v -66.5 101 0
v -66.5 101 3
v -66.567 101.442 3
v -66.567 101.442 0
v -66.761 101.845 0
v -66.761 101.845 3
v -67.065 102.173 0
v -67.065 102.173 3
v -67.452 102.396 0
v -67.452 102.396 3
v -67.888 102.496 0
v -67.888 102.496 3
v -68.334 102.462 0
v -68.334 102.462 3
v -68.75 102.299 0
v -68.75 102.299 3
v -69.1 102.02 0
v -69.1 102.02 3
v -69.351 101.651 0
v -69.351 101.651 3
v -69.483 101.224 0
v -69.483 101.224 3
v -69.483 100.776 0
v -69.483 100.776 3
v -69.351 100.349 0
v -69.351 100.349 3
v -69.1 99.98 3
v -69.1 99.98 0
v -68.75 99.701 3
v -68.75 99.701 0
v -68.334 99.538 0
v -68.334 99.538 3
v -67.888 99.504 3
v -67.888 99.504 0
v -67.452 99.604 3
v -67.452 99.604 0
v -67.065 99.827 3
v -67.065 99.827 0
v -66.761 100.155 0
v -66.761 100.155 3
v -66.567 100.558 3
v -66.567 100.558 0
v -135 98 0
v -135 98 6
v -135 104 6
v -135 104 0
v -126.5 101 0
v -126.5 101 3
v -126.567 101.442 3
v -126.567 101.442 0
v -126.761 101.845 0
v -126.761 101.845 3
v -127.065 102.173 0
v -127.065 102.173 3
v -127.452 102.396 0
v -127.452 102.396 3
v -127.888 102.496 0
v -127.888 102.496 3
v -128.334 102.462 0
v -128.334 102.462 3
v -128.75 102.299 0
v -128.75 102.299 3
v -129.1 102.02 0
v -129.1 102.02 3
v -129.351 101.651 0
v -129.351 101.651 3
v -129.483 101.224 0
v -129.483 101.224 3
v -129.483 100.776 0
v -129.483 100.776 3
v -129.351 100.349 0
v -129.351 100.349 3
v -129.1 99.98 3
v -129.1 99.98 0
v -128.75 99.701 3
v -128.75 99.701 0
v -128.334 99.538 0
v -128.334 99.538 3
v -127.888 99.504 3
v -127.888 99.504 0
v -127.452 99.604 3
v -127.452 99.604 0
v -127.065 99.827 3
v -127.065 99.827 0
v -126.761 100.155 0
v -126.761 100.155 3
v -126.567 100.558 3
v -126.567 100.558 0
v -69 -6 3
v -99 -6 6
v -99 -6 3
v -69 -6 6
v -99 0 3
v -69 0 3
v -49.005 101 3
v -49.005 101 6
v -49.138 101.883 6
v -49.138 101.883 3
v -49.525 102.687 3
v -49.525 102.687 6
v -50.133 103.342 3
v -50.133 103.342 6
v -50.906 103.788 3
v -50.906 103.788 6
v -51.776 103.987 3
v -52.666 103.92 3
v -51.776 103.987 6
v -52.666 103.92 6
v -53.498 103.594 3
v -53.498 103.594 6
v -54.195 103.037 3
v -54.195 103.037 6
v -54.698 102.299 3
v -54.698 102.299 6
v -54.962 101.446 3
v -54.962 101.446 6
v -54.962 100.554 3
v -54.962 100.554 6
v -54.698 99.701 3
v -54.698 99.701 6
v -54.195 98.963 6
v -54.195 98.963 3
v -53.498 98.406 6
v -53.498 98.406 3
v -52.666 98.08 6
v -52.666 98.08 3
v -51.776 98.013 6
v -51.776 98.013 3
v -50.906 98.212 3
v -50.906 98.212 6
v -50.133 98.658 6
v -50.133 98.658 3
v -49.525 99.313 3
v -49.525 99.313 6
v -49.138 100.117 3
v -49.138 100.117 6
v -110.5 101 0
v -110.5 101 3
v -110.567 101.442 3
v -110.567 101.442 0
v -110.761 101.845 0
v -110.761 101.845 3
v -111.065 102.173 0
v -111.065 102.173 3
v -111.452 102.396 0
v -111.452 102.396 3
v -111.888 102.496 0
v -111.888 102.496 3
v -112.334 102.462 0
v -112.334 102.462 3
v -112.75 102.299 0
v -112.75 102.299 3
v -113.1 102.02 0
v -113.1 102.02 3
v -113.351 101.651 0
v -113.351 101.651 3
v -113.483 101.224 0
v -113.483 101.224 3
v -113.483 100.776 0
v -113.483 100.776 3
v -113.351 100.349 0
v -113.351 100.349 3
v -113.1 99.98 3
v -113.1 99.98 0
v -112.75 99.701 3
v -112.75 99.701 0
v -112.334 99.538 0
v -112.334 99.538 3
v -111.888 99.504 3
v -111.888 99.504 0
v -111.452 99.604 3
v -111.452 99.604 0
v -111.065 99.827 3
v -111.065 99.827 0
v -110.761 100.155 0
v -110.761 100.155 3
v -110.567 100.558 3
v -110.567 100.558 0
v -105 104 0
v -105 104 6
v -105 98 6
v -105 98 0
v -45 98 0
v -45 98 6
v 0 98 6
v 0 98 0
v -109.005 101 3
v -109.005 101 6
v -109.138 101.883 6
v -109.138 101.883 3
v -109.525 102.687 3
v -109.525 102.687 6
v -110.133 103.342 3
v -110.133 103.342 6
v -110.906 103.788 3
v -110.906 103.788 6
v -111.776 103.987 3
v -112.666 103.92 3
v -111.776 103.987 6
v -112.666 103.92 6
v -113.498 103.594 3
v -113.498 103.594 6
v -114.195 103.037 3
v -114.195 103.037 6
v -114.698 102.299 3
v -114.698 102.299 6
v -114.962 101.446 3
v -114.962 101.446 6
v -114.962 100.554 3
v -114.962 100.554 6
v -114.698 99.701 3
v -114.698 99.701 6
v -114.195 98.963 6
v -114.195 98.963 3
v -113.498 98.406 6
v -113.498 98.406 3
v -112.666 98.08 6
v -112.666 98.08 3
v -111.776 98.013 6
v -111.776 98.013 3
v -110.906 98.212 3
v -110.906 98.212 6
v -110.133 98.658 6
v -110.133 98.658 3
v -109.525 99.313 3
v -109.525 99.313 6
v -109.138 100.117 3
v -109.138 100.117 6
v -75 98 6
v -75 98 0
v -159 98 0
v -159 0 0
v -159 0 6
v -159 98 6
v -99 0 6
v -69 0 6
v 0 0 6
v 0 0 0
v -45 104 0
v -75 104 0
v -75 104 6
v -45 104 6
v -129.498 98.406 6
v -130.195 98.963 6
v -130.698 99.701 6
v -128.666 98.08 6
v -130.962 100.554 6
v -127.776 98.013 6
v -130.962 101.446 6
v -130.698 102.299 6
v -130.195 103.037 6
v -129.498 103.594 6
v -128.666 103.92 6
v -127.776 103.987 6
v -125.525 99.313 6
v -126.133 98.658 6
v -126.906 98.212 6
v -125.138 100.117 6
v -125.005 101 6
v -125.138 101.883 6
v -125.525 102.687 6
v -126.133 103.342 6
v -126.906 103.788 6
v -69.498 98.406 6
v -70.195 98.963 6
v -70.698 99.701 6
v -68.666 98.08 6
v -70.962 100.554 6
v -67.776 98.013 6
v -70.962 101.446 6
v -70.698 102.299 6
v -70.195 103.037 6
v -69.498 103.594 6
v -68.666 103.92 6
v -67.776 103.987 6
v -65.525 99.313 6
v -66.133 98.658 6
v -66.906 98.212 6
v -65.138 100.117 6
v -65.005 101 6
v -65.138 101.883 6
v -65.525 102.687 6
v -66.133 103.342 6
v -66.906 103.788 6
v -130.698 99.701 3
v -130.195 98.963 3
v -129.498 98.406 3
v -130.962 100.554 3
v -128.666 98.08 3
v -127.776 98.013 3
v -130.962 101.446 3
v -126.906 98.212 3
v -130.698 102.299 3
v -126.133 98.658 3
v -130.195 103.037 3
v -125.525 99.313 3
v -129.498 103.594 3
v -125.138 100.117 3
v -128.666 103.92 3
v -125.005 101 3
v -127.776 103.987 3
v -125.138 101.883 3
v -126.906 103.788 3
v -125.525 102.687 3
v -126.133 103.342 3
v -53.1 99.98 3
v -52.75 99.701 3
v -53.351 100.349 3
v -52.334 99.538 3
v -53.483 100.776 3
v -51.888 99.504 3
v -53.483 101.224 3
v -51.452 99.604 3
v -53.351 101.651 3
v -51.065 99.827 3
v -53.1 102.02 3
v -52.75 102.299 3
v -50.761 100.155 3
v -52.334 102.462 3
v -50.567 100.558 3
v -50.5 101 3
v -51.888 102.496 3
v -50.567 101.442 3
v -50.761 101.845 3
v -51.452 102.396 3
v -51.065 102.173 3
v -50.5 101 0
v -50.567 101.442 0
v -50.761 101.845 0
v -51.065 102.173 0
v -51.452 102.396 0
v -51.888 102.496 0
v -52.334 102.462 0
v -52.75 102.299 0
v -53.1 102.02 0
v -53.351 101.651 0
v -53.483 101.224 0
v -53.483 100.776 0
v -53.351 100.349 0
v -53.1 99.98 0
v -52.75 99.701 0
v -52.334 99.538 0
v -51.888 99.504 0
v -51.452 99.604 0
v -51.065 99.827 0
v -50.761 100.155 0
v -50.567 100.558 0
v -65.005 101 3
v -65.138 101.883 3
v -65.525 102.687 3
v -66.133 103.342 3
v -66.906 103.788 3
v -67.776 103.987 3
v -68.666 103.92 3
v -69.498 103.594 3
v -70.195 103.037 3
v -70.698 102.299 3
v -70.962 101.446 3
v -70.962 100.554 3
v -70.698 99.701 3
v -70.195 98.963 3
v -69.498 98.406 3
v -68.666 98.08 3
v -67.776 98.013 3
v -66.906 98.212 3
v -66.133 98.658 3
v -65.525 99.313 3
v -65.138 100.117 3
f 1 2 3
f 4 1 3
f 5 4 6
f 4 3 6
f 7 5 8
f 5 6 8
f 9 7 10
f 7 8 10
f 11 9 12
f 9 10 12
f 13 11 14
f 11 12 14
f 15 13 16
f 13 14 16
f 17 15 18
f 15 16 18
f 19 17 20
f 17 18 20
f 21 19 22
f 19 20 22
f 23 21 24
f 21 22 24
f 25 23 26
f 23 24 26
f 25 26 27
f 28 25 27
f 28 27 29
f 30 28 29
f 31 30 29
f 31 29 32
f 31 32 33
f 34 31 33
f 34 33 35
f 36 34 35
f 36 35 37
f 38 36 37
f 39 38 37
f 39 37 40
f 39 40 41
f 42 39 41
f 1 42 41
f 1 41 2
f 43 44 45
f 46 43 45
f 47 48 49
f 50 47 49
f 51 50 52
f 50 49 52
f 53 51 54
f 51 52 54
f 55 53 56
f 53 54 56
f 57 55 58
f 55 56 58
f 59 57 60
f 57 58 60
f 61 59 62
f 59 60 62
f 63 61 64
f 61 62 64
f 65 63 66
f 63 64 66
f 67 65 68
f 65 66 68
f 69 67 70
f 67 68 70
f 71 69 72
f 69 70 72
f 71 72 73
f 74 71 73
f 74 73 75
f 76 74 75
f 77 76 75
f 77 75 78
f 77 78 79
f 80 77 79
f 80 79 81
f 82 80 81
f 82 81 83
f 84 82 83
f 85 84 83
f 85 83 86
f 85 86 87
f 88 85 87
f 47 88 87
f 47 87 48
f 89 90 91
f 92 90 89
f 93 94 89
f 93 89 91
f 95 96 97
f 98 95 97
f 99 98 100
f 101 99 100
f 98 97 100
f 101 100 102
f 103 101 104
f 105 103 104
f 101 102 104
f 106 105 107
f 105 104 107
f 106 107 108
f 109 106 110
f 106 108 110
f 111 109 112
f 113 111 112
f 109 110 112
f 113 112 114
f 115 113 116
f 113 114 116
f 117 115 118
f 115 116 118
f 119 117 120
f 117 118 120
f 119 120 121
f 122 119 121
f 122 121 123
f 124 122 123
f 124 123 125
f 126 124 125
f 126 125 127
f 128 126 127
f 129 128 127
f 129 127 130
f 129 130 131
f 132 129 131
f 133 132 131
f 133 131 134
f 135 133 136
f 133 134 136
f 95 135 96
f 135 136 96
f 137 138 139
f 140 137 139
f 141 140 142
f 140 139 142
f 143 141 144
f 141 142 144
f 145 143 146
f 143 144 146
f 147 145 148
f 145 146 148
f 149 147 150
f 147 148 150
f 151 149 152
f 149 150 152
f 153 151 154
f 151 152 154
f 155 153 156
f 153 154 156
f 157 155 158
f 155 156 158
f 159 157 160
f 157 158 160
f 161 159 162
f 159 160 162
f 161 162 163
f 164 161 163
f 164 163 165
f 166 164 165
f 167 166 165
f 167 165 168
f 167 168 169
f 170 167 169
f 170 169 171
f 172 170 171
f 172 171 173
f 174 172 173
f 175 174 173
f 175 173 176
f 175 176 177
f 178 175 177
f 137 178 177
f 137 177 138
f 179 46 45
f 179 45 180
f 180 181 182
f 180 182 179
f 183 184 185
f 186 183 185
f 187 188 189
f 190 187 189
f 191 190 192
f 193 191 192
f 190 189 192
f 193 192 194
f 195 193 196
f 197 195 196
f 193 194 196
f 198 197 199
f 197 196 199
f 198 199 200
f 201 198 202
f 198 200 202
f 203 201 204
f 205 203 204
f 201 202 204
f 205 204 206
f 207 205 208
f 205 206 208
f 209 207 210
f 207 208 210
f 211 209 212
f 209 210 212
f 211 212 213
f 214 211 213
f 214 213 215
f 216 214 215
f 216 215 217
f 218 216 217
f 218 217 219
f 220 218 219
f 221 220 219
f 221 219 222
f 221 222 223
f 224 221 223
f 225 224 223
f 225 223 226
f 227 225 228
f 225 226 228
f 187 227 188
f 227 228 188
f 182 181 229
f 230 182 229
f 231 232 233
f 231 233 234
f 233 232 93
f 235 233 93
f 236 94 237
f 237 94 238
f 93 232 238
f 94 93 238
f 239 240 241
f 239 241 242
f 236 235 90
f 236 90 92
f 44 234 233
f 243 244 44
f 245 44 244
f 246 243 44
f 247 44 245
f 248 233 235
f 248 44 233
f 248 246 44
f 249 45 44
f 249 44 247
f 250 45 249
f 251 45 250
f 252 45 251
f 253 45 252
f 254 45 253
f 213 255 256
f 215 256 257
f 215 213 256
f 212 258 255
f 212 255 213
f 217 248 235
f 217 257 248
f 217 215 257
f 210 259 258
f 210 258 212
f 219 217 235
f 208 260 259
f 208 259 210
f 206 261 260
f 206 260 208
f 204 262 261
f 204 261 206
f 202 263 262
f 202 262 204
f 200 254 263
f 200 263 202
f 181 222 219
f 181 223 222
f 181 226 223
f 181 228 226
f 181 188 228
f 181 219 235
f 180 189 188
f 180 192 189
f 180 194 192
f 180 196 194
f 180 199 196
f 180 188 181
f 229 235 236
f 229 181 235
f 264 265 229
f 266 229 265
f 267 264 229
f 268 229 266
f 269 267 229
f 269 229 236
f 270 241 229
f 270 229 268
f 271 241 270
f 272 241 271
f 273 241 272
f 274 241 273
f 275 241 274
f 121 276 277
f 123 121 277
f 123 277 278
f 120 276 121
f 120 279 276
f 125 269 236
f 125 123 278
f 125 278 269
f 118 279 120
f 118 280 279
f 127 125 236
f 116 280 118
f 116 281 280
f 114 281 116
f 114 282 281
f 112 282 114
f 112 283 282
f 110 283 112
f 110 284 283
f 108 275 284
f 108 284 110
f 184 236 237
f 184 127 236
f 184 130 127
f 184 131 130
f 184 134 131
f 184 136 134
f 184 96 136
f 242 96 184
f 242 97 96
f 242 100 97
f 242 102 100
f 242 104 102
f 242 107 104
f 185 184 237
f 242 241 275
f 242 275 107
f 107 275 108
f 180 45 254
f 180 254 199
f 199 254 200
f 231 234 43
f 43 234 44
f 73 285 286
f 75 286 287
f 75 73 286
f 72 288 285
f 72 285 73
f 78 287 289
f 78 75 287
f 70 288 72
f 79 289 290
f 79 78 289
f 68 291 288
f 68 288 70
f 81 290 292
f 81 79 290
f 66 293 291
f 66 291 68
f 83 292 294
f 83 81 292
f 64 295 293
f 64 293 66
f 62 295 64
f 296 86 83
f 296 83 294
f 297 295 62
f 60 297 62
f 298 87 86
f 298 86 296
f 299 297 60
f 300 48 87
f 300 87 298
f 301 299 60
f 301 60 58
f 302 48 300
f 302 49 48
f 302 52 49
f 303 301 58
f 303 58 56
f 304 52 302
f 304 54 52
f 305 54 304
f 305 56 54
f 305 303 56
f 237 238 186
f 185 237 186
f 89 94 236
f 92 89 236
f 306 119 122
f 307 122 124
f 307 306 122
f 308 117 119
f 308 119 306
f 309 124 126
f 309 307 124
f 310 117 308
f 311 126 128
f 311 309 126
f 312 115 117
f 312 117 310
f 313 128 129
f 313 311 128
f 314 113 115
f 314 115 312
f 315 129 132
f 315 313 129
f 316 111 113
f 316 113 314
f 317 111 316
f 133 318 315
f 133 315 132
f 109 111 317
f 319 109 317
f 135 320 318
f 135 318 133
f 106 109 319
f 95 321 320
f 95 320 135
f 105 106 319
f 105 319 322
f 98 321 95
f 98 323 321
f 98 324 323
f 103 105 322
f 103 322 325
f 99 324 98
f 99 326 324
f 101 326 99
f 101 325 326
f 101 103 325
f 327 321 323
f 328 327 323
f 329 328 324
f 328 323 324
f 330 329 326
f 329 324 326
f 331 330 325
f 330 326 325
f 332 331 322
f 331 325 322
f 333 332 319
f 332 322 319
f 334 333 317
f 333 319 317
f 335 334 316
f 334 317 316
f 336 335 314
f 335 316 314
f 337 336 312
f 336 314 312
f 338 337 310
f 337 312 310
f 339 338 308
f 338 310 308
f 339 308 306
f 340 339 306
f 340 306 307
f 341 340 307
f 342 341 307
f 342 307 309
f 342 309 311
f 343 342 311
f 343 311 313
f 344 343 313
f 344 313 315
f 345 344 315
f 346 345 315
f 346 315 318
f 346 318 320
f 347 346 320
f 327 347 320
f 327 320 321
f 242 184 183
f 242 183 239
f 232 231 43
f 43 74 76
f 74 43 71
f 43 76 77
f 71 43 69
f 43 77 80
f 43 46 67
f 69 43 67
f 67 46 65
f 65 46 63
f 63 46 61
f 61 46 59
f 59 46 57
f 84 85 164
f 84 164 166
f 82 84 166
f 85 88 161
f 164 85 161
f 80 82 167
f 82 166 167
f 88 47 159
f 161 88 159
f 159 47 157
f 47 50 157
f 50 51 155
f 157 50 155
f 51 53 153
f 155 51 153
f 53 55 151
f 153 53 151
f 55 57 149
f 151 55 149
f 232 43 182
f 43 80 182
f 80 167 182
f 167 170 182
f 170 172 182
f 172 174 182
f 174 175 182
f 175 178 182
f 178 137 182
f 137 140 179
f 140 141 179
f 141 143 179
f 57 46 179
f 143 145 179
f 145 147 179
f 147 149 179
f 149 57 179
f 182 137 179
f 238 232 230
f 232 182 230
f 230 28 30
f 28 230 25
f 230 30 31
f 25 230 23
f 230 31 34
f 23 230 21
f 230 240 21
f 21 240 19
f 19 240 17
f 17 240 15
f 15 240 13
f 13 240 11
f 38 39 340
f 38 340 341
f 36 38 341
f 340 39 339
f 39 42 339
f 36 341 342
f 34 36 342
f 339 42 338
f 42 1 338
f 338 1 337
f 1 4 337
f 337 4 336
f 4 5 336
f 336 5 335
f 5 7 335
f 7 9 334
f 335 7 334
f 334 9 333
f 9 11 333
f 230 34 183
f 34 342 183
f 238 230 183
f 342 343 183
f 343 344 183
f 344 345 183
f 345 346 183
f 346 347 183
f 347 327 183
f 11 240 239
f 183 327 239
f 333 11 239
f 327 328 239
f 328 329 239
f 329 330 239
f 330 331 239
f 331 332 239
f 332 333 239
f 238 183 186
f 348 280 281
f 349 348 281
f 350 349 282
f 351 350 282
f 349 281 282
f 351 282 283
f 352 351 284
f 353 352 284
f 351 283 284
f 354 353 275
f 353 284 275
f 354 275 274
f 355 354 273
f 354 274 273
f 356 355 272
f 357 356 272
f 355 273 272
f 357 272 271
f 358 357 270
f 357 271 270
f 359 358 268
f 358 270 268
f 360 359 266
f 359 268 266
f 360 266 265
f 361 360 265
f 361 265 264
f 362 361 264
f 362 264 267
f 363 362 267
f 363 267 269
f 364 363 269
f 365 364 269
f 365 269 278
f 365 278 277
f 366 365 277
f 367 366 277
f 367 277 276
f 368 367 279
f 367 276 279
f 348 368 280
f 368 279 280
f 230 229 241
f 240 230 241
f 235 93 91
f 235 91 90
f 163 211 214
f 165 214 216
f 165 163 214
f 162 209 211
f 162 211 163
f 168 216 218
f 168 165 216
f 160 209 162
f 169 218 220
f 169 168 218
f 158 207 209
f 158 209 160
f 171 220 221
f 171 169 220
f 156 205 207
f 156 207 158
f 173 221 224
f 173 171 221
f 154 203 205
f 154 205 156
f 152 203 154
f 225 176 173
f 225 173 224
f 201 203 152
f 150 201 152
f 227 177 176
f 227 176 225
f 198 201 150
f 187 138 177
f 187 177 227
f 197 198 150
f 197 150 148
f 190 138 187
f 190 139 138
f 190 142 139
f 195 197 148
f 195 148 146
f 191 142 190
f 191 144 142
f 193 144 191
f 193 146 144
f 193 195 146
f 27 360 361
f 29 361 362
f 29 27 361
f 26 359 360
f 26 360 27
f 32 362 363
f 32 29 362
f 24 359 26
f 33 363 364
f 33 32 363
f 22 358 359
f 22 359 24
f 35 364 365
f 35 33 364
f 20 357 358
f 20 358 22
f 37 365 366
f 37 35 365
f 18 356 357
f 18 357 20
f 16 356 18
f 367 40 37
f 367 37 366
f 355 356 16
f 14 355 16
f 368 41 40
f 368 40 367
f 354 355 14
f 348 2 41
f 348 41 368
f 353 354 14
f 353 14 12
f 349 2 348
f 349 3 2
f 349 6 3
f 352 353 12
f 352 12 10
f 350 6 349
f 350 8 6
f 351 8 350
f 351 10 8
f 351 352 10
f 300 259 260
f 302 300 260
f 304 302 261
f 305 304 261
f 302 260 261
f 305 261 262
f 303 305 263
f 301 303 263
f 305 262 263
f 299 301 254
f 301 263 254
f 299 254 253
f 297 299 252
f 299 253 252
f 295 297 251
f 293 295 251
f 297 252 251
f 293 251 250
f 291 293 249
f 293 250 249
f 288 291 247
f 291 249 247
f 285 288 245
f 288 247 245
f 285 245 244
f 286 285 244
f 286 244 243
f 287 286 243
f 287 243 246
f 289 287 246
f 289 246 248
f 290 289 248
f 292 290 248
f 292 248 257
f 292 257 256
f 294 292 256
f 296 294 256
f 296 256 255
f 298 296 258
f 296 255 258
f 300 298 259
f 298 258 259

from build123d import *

# Parameters (mm, degrees)
ESQUISSE1_W             = 159
ESQUISSE1_H             = 104
BOSS_EXTRU_1_DEPTH      = 6
ESQUISSE2_W             = 24
ESQUISSE2_H             = 6
ESQUISSE2_W_2           = 45
ESQUISSE2_W_3           = 30
ENL_V_MAT_EXTRU_1_DEPTH = 191.086822268
ESQUISSE3_R             = 1.5
ENL_V_MAT_EXTRU_2_DEPTH = 191.086822268
ESQUISSE4_R             = 2.995
ENL_V_MAT_EXTRU_3_DEPTH = 3
ESQUISSE5_W             = 30
ESQUISSE5_H             = 6
BOSS_EXTRU_2_DEPTH      = 6
ESQUISSE6_W             = 30
ESQUISSE6_H             = 6
ENL_V_MAT_EXTRU_4_DEPTH = 3


with BuildPart() as part:
    # Esquisse1 → Boss.-Extru.1 (new body)
    with BuildSketch(Plane.XY):
        with Locations((-79.5, 52)):
            Rectangle(ESQUISSE1_W, ESQUISSE1_H)
    extrude(amount=BOSS_EXTRU_1_DEPTH)

    # Esquisse2 → Enlèv. mat.-Extru.1 (cut, through all)
    with BuildSketch(Plane.XY.offset(6)):
        with Locations((-147, 101)):
            Rectangle(ESQUISSE2_W, ESQUISSE2_H)
        with Locations((-22.5, 101)):
            Rectangle(ESQUISSE2_W_2, ESQUISSE2_H)
        with Locations((-90, 101)):
            Rectangle(ESQUISSE2_W_3, ESQUISSE2_H)
    extrude(amount=-ENL_V_MAT_EXTRU_1_DEPTH, mode=Mode.SUBTRACT)

    # Esquisse3 → Enlèv. mat.-Extru.2 (cut, through all)
    with BuildSketch(Plane.XY.offset(6)):
        with Locations((-128, 101)):
            Circle(ESQUISSE3_R)
        with Locations((-112, 101)):
            Circle(ESQUISSE3_R)
        with Locations((-68, 101)):
            Circle(ESQUISSE3_R)
        with Locations((-52, 101)):
            Circle(ESQUISSE3_R)
    extrude(amount=-ENL_V_MAT_EXTRU_2_DEPTH, mode=Mode.SUBTRACT)

    # Esquisse4 → Enlèv. mat.-Extru.3 (cut)
    with BuildSketch(Plane.XY.offset(6)):
        with Locations((-128, 101)):
            Circle(ESQUISSE4_R)
        with Locations((-112, 101)):
            Circle(ESQUISSE4_R)
        with Locations((-68, 101)):
            Circle(ESQUISSE4_R)
        with Locations((-52, 101)):
            Circle(ESQUISSE4_R)
    extrude(amount=-ENL_V_MAT_EXTRU_3_DEPTH, mode=Mode.SUBTRACT)

    # Esquisse5 → Boss.-Extru.2 (add)
    with BuildSketch(Plane.XZ):
        with Locations((-84, 3)):
            Rectangle(ESQUISSE5_W, ESQUISSE5_H)
    extrude(amount=BOSS_EXTRU_2_DEPTH)

    # Esquisse6 → Enlèv. mat.-Extru.4 (cut)
    with BuildSketch(Plane(origin=(0, 0, 0), x_dir=(-1, 0, 0), z_dir=(0, 0, -1))):
        with Locations((84, -3)):
            Rectangle(ESQUISSE6_W, ESQUISSE6_H)
    extrude(amount=-ENL_V_MAT_EXTRU_4_DEPTH, mode=Mode.SUBTRACT)


solid = part.part
